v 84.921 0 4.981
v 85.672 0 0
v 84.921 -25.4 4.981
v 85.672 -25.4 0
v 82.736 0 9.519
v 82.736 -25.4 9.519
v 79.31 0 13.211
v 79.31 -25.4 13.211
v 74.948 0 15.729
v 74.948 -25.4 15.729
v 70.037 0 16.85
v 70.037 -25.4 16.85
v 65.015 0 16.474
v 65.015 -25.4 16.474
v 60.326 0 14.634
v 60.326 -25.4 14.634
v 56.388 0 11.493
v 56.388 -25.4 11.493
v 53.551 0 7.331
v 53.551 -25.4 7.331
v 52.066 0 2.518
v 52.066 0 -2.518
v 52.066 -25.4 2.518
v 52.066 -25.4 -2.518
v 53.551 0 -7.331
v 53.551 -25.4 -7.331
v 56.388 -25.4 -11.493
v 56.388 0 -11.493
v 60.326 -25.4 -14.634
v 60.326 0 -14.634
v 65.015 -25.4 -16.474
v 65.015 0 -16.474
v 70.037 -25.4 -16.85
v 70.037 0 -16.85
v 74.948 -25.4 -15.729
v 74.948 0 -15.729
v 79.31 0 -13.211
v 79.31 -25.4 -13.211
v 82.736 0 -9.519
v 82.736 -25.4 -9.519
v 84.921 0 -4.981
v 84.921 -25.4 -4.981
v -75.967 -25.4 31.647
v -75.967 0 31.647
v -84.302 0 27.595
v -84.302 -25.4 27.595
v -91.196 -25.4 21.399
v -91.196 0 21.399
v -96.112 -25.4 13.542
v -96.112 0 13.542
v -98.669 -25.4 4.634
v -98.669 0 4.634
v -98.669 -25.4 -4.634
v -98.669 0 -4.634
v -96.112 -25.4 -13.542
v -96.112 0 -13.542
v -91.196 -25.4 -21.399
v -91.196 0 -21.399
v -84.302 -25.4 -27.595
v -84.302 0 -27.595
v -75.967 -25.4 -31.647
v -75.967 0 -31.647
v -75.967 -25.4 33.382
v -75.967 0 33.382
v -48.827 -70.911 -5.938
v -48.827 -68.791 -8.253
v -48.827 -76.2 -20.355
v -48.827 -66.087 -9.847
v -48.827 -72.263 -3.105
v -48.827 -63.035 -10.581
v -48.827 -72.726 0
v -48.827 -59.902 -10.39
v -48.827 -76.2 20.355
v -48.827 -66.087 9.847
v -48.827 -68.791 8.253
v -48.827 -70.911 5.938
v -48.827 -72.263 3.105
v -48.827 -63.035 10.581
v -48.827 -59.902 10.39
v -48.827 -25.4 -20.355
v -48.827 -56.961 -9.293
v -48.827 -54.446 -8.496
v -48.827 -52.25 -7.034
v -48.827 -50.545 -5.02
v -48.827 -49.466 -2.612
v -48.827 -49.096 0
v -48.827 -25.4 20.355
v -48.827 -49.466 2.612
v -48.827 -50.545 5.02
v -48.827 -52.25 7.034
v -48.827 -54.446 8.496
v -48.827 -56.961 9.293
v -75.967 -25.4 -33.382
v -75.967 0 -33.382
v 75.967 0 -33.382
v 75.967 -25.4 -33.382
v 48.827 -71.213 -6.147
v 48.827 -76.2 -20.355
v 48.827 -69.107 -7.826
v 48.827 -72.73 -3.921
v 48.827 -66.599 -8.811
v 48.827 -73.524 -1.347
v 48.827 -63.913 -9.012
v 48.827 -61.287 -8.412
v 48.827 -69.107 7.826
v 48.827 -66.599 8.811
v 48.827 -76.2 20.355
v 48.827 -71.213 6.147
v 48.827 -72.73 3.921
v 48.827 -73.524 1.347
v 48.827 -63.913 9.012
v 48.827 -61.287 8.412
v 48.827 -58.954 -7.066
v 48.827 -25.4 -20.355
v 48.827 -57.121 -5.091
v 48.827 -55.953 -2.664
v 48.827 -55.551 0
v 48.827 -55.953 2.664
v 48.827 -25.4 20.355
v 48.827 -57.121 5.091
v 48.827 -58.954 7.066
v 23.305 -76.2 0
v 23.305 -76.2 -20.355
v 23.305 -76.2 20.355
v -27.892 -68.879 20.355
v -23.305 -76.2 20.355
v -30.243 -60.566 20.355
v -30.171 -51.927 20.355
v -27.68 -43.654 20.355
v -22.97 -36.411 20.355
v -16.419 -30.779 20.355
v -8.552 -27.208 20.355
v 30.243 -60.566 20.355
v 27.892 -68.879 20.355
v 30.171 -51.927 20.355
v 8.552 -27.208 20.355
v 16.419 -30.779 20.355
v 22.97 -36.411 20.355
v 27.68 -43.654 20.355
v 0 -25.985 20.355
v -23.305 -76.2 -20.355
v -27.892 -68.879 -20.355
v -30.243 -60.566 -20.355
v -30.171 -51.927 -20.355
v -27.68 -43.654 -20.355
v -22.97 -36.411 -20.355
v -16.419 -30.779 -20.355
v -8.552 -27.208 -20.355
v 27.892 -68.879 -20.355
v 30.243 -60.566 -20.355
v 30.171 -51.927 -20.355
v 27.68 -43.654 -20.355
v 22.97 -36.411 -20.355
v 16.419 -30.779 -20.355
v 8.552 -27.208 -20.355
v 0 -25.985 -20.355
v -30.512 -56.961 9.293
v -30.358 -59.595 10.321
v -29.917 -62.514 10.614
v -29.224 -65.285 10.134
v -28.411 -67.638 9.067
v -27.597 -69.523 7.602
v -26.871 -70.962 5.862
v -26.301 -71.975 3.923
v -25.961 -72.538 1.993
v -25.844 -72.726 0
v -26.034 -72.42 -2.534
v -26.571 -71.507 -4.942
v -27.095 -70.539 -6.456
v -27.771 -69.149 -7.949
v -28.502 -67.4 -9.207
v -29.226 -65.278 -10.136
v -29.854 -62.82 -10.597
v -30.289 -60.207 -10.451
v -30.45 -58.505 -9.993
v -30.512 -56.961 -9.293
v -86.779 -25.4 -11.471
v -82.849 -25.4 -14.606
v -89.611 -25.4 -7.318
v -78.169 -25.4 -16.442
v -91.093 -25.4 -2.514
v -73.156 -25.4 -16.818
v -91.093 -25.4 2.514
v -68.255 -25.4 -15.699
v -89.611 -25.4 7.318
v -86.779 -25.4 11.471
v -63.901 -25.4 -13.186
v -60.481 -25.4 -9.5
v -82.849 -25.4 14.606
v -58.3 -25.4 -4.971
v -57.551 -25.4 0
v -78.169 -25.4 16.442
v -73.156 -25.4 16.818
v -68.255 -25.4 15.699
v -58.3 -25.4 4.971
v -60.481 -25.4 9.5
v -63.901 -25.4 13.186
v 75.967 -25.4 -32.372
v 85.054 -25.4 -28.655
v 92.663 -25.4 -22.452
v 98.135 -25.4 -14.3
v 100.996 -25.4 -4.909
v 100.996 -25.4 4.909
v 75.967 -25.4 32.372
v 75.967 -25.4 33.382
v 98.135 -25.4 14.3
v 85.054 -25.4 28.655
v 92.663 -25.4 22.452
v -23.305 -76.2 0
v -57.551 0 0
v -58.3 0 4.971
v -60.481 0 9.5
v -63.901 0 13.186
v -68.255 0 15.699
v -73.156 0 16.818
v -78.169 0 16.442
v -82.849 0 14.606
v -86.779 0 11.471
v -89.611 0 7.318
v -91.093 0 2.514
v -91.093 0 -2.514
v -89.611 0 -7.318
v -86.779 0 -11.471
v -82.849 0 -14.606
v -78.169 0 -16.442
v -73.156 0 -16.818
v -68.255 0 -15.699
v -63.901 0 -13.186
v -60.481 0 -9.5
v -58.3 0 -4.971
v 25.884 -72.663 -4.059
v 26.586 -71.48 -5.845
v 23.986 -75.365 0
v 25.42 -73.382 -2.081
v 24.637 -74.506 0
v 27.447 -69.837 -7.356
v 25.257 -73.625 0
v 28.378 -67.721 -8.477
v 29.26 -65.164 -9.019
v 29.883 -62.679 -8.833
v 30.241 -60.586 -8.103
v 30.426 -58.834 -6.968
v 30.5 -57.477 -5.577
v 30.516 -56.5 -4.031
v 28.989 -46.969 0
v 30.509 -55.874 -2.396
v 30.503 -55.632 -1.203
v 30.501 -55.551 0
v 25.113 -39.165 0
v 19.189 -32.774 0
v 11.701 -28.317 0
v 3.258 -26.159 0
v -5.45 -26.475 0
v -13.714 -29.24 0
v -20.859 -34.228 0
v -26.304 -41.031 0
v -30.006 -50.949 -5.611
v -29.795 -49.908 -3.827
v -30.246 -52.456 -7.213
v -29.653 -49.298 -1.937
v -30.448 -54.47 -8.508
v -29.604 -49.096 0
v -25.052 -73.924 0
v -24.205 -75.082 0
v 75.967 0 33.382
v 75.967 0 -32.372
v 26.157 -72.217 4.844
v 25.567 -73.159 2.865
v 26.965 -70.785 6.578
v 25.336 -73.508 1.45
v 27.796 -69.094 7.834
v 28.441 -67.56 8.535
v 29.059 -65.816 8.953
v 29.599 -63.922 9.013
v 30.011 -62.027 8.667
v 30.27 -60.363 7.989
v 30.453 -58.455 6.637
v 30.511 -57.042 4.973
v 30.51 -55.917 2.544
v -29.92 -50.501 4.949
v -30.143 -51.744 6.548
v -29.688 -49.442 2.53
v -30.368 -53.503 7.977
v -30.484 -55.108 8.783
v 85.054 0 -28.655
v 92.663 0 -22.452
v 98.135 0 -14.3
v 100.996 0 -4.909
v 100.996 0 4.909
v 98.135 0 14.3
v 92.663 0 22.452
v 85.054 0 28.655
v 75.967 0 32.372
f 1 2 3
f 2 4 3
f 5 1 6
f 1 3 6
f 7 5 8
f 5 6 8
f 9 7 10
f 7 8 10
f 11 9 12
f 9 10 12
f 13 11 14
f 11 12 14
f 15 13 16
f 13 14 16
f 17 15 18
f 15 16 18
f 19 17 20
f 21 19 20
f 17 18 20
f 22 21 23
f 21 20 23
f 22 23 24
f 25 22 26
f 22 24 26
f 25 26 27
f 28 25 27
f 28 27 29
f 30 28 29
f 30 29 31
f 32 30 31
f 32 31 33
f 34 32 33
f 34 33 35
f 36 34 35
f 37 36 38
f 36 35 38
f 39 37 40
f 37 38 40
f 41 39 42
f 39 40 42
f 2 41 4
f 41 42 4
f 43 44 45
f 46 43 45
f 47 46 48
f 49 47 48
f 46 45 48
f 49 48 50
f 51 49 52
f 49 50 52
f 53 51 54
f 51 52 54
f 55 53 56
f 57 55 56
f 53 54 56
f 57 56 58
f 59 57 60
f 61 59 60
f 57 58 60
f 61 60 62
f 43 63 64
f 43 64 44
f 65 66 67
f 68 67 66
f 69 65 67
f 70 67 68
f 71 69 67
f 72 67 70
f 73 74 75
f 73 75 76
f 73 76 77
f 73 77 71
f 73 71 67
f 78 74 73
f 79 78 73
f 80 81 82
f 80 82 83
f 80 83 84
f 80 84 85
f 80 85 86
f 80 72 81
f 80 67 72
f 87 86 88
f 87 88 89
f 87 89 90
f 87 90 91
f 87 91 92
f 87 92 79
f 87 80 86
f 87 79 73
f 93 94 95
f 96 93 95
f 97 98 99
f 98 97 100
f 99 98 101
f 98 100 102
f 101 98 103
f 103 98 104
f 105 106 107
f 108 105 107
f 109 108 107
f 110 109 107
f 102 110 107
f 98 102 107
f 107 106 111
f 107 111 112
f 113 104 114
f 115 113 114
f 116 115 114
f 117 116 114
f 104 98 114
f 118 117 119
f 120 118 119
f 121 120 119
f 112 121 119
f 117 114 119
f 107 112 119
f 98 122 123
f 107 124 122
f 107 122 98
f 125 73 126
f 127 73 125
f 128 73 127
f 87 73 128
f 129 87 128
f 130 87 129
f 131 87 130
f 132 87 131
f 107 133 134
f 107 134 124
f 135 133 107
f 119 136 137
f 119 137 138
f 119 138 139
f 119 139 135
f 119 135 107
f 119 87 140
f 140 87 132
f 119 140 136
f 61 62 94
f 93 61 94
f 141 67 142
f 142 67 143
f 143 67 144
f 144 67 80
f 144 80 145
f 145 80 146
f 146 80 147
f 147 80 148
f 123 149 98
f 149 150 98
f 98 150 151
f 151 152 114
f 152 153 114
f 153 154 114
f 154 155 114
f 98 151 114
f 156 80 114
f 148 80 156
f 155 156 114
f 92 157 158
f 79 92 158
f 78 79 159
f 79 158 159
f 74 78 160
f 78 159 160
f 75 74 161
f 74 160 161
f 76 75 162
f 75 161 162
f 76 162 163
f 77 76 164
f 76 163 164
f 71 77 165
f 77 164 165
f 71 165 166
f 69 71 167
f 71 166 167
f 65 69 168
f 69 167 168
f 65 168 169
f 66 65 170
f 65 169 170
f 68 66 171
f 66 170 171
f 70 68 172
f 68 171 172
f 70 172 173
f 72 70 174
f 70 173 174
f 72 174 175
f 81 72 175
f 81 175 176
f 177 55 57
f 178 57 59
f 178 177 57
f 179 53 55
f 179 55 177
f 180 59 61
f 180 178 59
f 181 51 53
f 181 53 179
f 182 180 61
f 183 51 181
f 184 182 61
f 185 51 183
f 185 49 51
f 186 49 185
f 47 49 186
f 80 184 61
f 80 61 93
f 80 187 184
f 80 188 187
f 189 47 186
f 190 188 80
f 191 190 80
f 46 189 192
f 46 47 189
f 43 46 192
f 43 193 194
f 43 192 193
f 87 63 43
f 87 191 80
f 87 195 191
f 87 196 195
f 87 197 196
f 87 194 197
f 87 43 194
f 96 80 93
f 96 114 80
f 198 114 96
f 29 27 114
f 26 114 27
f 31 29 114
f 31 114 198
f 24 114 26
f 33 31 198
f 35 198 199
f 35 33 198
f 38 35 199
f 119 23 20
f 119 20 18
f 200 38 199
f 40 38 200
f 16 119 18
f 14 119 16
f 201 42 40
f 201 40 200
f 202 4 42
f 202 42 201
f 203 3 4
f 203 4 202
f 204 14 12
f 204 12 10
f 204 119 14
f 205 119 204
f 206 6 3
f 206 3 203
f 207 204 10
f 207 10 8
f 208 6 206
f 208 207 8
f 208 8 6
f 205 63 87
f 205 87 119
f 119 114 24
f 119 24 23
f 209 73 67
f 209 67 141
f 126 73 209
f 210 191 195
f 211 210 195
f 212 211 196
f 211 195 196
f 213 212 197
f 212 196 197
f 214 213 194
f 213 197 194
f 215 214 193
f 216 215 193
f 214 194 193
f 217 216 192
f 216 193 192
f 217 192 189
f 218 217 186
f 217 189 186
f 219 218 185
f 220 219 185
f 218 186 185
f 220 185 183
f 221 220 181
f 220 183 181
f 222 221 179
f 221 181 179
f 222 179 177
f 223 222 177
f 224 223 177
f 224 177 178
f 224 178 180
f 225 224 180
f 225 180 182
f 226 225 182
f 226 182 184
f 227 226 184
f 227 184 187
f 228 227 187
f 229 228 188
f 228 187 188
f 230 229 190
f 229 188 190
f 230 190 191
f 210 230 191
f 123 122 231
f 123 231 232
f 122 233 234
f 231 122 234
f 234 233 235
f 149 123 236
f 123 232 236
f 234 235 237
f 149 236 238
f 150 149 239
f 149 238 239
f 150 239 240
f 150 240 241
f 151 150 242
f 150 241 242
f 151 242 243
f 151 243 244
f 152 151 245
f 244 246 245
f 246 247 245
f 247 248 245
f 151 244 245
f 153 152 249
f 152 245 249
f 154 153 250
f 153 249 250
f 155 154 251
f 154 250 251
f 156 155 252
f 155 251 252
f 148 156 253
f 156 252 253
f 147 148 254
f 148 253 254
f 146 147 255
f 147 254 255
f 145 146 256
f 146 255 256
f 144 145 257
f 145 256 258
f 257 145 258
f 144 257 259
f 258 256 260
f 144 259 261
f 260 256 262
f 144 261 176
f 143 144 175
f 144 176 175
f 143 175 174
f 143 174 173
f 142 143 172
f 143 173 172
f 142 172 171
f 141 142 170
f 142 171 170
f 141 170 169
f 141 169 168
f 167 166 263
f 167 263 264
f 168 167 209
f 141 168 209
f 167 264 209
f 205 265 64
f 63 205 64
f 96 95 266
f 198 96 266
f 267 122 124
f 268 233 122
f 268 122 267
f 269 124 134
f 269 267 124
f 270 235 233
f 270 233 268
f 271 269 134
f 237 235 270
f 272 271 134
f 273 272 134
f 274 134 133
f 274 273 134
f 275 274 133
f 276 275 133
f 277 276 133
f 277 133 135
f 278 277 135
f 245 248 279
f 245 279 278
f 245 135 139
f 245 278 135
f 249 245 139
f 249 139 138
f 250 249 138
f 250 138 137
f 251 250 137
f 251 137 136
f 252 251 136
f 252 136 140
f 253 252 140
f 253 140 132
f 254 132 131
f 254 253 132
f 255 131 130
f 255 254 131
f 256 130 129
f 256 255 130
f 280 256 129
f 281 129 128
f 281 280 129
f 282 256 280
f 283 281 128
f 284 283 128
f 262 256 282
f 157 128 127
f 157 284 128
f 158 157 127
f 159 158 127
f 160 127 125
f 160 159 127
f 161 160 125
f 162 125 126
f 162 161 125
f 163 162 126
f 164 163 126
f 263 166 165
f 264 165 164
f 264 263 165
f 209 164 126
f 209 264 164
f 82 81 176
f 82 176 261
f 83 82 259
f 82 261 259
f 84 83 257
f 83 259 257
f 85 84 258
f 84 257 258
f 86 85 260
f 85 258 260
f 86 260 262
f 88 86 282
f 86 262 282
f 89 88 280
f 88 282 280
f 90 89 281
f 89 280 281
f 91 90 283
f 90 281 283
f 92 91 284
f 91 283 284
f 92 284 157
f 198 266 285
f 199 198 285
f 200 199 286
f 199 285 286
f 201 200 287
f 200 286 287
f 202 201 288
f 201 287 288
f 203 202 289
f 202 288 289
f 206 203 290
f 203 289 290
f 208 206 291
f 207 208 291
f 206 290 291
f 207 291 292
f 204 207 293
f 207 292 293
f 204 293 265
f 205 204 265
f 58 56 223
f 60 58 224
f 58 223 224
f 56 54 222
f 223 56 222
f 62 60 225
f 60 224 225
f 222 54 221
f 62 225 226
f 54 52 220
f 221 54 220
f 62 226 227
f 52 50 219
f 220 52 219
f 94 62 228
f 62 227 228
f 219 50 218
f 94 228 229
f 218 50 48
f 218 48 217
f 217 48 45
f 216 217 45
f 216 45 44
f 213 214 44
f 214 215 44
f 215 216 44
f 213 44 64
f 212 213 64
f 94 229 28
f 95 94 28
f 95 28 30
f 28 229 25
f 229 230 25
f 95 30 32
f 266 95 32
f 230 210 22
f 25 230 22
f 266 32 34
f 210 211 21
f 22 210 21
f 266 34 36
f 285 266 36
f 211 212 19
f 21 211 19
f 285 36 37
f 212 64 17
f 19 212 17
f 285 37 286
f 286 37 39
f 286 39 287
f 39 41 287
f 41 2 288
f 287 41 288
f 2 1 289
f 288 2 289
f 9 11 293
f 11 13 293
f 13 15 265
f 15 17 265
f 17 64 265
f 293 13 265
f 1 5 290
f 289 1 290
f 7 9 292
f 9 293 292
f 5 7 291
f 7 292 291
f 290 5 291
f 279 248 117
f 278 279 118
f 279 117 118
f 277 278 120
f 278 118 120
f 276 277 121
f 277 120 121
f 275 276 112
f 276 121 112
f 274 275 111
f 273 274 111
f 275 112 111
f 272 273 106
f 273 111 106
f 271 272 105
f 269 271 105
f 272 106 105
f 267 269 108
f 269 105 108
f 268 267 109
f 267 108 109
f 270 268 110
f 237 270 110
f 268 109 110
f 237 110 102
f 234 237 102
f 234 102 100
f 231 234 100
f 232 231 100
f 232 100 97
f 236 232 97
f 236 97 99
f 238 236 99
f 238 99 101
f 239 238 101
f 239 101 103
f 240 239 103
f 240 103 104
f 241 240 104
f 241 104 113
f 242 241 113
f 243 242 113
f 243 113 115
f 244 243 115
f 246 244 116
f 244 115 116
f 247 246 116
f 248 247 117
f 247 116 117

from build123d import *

# Parameters (mm, degrees)
F2_DEPTH  = 25.4
F3_R      = 14.2869829167
F3_R_2    = 15.0362053168
F4_DEPTH  = 25.4
F5_R      = 15.0979548497
F6_DEPTH  = 25.4
F7_R      = 16.8973706764
F8_DEPTH  = 12.7
F9_DEPTH  = 25.4
F10_R     = 15.3471381564
F11_DEPTH = 76.2
F12_DEPTH = 25.4
F13_R     = 16.8651828774
F14_DEPTH = 25.4
F15_W     = 97.6533442736
F15_H     = 40.7104864717
F16_DEPTH = 76.2
F17_R     = 30.5155055684
F18_DEPTH = 25.4
F19_DEPTH = 25.4
F20_R     = 10.6213754379
F21_DEPTH = 50.8
F22_R     = 9.4222372935
F23_DEPTH = 50.8
F24_R     = 9.0371424161
F25_DEPTH = 25.4


with BuildPart() as f2:
    # F1 (on face) → F2 (new body)
    with BuildSketch(Plane.XZ):
        with BuildLine():
            Line((75.9671404958, 32.3720407565), (75.9671404958, 33.3821922541))
            Line((75.9671404958, 33.3821922541), (-75.9671404958, 33.3821922541))
            Line((-75.9671404958, 33.3821922541), (-75.9671404958, 31.6472478295))
            ThreePointArc((-75.9671404958, 31.6472478295), (-98.9936606225, 0), (-75.9671404958, -31.6472478295))
            Line((-75.9671404958, -31.6472478295), (-75.9671404958, -33.3821922541))
            Line((-75.9671404958, -33.3821922541), (75.9671404958, -33.3821922541))
            Line((75.9671404958, -33.3821922541), (75.9671404958, -32.3720407565))
            ThreePointArc((75.9671404958, -32.3720407565), (101.3590356441, 0), (75.9671404958, 32.3720407565))
        make_face()
    extrude(amount=F2_DEPTH)

    # F3 (on Front) → F4 (cut)
    with BuildSketch(Plane.XZ):
        with Locations((-75.3733813763, 0)):
            Circle(F3_R)
        with Locations((76.2721076608, 0)):
            Circle(F3_R_2)
    extrude(amount=-F4_DEPTH, mode=Mode.SUBTRACT)

    # F5 (on Front) → F6 (cut)
    with BuildSketch(Plane.XZ):
        with Locations((74.6077895164, 0)):
            Circle(F5_R)
    extrude(amount=-F6_DEPTH, mode=Mode.SUBTRACT)

    # F7 (on Front) → F8 (cut, symmetric)
    with BuildSketch(Plane.XZ):
        with Locations((68.7745809555, 0)):
            Circle(F7_R)
    extrude(amount=F8_DEPTH, both=True, mode=Mode.SUBTRACT)

    # F0 (on Front) → F9 (cut)
    with BuildSketch(Plane.XZ):
        with BuildLine():
            Line((75.9671404958, 33.3821922541), (-75.9671404958, 33.3821922541))
            Line((-75.9671404958, 33.3821922541), (-75.9671404958, 31.6472478295))
            ThreePointArc((-75.9671404958, 31.6472478295), (-98.9936606225, 0), (-75.9671404958, -31.6472478295))
            Line((-75.9671404958, -31.6472478295), (-75.9671404958, -33.3821922541))
            Line((-75.9671404958, -33.3821922541), (75.9671404958, -33.3821922541))
            Line((75.9671404958, -33.3821922541), (75.9671404958, -32.3720407565))
            ThreePointArc((75.9671404958, -32.3720407565), (101.3590356441, 0), (75.9671404958, 32.3720407565))
            Line((75.9671404958, 32.3720407565), (75.9671404958, 33.3821922541))
        make_face()
    extrude(amount=-F9_DEPTH, mode=Mode.SUBTRACT)

    # F10 (on Front) → F11 (cut)
    with BuildSketch(Plane.XZ):
        with Locations((-71.0009858012, 0)):
            Circle(F10_R)
    extrude(amount=-F11_DEPTH, mode=Mode.SUBTRACT)

    # F12 (cut): a face of the model
    f12_faces = [f2.faces().sort_by_distance(p)[0] for p in [
        (68.7745809555, -12.7, 0),
    ]]
    extrude(f12_faces, amount=-F12_DEPTH, mode=Mode.SUBTRACT)

    # F13 (on face) → F14 (cut)
    with BuildSketch(Plane.XZ.offset(25.4)):
        with Locations((-74.4160786271, 0)):
            Circle(F13_R)
    extrude(amount=-F14_DEPTH, mode=Mode.SUBTRACT)

    # F15 (on Front) → F16 (join)
    with BuildSketch(Plane.XZ):
        Rectangle(F15_W, F15_H)
    extrude(amount=F16_DEPTH)

    # F17 (on Top) → F18 (cut)
    with BuildSketch(Plane.XY):
        with Locations((0, -56.5003752708)):
            Circle(F17_R)
    extrude(amount=-F18_DEPTH, mode=Mode.SUBTRACT)

    # F19 (cut): a face of the model
    f19_faces = [f2.faces().sort_by_distance(p)[0] for p in [
        (0, -53.2237488091, 0),
    ]]
    extrude(f19_faces, amount=-F19_DEPTH, mode=Mode.SUBTRACT)

    # F20 (on Right) → F21 (cut)
    with BuildSketch(Plane.YZ):
        with Locations((-62.1050074697, 0)):
            Circle(F20_R)
    extrude(amount=-F21_DEPTH, mode=Mode.SUBTRACT)

    # F22 (on Right) → F23 (cut)
    with BuildSketch(Plane.YZ):
        with Locations((-58.5186779499, 0)):
            Circle(F22_R)
    extrude(amount=-F23_DEPTH, mode=Mode.SUBTRACT)

    # F24 (on face) → F25 (cut)
    with BuildSketch(Plane.YZ.offset(48.8266721368)):
        with Locations((-64.5882040262, 0)):
            Circle(F24_R)
    extrude(amount=-F25_DEPTH, mode=Mode.SUBTRACT)


solid = f2.part
